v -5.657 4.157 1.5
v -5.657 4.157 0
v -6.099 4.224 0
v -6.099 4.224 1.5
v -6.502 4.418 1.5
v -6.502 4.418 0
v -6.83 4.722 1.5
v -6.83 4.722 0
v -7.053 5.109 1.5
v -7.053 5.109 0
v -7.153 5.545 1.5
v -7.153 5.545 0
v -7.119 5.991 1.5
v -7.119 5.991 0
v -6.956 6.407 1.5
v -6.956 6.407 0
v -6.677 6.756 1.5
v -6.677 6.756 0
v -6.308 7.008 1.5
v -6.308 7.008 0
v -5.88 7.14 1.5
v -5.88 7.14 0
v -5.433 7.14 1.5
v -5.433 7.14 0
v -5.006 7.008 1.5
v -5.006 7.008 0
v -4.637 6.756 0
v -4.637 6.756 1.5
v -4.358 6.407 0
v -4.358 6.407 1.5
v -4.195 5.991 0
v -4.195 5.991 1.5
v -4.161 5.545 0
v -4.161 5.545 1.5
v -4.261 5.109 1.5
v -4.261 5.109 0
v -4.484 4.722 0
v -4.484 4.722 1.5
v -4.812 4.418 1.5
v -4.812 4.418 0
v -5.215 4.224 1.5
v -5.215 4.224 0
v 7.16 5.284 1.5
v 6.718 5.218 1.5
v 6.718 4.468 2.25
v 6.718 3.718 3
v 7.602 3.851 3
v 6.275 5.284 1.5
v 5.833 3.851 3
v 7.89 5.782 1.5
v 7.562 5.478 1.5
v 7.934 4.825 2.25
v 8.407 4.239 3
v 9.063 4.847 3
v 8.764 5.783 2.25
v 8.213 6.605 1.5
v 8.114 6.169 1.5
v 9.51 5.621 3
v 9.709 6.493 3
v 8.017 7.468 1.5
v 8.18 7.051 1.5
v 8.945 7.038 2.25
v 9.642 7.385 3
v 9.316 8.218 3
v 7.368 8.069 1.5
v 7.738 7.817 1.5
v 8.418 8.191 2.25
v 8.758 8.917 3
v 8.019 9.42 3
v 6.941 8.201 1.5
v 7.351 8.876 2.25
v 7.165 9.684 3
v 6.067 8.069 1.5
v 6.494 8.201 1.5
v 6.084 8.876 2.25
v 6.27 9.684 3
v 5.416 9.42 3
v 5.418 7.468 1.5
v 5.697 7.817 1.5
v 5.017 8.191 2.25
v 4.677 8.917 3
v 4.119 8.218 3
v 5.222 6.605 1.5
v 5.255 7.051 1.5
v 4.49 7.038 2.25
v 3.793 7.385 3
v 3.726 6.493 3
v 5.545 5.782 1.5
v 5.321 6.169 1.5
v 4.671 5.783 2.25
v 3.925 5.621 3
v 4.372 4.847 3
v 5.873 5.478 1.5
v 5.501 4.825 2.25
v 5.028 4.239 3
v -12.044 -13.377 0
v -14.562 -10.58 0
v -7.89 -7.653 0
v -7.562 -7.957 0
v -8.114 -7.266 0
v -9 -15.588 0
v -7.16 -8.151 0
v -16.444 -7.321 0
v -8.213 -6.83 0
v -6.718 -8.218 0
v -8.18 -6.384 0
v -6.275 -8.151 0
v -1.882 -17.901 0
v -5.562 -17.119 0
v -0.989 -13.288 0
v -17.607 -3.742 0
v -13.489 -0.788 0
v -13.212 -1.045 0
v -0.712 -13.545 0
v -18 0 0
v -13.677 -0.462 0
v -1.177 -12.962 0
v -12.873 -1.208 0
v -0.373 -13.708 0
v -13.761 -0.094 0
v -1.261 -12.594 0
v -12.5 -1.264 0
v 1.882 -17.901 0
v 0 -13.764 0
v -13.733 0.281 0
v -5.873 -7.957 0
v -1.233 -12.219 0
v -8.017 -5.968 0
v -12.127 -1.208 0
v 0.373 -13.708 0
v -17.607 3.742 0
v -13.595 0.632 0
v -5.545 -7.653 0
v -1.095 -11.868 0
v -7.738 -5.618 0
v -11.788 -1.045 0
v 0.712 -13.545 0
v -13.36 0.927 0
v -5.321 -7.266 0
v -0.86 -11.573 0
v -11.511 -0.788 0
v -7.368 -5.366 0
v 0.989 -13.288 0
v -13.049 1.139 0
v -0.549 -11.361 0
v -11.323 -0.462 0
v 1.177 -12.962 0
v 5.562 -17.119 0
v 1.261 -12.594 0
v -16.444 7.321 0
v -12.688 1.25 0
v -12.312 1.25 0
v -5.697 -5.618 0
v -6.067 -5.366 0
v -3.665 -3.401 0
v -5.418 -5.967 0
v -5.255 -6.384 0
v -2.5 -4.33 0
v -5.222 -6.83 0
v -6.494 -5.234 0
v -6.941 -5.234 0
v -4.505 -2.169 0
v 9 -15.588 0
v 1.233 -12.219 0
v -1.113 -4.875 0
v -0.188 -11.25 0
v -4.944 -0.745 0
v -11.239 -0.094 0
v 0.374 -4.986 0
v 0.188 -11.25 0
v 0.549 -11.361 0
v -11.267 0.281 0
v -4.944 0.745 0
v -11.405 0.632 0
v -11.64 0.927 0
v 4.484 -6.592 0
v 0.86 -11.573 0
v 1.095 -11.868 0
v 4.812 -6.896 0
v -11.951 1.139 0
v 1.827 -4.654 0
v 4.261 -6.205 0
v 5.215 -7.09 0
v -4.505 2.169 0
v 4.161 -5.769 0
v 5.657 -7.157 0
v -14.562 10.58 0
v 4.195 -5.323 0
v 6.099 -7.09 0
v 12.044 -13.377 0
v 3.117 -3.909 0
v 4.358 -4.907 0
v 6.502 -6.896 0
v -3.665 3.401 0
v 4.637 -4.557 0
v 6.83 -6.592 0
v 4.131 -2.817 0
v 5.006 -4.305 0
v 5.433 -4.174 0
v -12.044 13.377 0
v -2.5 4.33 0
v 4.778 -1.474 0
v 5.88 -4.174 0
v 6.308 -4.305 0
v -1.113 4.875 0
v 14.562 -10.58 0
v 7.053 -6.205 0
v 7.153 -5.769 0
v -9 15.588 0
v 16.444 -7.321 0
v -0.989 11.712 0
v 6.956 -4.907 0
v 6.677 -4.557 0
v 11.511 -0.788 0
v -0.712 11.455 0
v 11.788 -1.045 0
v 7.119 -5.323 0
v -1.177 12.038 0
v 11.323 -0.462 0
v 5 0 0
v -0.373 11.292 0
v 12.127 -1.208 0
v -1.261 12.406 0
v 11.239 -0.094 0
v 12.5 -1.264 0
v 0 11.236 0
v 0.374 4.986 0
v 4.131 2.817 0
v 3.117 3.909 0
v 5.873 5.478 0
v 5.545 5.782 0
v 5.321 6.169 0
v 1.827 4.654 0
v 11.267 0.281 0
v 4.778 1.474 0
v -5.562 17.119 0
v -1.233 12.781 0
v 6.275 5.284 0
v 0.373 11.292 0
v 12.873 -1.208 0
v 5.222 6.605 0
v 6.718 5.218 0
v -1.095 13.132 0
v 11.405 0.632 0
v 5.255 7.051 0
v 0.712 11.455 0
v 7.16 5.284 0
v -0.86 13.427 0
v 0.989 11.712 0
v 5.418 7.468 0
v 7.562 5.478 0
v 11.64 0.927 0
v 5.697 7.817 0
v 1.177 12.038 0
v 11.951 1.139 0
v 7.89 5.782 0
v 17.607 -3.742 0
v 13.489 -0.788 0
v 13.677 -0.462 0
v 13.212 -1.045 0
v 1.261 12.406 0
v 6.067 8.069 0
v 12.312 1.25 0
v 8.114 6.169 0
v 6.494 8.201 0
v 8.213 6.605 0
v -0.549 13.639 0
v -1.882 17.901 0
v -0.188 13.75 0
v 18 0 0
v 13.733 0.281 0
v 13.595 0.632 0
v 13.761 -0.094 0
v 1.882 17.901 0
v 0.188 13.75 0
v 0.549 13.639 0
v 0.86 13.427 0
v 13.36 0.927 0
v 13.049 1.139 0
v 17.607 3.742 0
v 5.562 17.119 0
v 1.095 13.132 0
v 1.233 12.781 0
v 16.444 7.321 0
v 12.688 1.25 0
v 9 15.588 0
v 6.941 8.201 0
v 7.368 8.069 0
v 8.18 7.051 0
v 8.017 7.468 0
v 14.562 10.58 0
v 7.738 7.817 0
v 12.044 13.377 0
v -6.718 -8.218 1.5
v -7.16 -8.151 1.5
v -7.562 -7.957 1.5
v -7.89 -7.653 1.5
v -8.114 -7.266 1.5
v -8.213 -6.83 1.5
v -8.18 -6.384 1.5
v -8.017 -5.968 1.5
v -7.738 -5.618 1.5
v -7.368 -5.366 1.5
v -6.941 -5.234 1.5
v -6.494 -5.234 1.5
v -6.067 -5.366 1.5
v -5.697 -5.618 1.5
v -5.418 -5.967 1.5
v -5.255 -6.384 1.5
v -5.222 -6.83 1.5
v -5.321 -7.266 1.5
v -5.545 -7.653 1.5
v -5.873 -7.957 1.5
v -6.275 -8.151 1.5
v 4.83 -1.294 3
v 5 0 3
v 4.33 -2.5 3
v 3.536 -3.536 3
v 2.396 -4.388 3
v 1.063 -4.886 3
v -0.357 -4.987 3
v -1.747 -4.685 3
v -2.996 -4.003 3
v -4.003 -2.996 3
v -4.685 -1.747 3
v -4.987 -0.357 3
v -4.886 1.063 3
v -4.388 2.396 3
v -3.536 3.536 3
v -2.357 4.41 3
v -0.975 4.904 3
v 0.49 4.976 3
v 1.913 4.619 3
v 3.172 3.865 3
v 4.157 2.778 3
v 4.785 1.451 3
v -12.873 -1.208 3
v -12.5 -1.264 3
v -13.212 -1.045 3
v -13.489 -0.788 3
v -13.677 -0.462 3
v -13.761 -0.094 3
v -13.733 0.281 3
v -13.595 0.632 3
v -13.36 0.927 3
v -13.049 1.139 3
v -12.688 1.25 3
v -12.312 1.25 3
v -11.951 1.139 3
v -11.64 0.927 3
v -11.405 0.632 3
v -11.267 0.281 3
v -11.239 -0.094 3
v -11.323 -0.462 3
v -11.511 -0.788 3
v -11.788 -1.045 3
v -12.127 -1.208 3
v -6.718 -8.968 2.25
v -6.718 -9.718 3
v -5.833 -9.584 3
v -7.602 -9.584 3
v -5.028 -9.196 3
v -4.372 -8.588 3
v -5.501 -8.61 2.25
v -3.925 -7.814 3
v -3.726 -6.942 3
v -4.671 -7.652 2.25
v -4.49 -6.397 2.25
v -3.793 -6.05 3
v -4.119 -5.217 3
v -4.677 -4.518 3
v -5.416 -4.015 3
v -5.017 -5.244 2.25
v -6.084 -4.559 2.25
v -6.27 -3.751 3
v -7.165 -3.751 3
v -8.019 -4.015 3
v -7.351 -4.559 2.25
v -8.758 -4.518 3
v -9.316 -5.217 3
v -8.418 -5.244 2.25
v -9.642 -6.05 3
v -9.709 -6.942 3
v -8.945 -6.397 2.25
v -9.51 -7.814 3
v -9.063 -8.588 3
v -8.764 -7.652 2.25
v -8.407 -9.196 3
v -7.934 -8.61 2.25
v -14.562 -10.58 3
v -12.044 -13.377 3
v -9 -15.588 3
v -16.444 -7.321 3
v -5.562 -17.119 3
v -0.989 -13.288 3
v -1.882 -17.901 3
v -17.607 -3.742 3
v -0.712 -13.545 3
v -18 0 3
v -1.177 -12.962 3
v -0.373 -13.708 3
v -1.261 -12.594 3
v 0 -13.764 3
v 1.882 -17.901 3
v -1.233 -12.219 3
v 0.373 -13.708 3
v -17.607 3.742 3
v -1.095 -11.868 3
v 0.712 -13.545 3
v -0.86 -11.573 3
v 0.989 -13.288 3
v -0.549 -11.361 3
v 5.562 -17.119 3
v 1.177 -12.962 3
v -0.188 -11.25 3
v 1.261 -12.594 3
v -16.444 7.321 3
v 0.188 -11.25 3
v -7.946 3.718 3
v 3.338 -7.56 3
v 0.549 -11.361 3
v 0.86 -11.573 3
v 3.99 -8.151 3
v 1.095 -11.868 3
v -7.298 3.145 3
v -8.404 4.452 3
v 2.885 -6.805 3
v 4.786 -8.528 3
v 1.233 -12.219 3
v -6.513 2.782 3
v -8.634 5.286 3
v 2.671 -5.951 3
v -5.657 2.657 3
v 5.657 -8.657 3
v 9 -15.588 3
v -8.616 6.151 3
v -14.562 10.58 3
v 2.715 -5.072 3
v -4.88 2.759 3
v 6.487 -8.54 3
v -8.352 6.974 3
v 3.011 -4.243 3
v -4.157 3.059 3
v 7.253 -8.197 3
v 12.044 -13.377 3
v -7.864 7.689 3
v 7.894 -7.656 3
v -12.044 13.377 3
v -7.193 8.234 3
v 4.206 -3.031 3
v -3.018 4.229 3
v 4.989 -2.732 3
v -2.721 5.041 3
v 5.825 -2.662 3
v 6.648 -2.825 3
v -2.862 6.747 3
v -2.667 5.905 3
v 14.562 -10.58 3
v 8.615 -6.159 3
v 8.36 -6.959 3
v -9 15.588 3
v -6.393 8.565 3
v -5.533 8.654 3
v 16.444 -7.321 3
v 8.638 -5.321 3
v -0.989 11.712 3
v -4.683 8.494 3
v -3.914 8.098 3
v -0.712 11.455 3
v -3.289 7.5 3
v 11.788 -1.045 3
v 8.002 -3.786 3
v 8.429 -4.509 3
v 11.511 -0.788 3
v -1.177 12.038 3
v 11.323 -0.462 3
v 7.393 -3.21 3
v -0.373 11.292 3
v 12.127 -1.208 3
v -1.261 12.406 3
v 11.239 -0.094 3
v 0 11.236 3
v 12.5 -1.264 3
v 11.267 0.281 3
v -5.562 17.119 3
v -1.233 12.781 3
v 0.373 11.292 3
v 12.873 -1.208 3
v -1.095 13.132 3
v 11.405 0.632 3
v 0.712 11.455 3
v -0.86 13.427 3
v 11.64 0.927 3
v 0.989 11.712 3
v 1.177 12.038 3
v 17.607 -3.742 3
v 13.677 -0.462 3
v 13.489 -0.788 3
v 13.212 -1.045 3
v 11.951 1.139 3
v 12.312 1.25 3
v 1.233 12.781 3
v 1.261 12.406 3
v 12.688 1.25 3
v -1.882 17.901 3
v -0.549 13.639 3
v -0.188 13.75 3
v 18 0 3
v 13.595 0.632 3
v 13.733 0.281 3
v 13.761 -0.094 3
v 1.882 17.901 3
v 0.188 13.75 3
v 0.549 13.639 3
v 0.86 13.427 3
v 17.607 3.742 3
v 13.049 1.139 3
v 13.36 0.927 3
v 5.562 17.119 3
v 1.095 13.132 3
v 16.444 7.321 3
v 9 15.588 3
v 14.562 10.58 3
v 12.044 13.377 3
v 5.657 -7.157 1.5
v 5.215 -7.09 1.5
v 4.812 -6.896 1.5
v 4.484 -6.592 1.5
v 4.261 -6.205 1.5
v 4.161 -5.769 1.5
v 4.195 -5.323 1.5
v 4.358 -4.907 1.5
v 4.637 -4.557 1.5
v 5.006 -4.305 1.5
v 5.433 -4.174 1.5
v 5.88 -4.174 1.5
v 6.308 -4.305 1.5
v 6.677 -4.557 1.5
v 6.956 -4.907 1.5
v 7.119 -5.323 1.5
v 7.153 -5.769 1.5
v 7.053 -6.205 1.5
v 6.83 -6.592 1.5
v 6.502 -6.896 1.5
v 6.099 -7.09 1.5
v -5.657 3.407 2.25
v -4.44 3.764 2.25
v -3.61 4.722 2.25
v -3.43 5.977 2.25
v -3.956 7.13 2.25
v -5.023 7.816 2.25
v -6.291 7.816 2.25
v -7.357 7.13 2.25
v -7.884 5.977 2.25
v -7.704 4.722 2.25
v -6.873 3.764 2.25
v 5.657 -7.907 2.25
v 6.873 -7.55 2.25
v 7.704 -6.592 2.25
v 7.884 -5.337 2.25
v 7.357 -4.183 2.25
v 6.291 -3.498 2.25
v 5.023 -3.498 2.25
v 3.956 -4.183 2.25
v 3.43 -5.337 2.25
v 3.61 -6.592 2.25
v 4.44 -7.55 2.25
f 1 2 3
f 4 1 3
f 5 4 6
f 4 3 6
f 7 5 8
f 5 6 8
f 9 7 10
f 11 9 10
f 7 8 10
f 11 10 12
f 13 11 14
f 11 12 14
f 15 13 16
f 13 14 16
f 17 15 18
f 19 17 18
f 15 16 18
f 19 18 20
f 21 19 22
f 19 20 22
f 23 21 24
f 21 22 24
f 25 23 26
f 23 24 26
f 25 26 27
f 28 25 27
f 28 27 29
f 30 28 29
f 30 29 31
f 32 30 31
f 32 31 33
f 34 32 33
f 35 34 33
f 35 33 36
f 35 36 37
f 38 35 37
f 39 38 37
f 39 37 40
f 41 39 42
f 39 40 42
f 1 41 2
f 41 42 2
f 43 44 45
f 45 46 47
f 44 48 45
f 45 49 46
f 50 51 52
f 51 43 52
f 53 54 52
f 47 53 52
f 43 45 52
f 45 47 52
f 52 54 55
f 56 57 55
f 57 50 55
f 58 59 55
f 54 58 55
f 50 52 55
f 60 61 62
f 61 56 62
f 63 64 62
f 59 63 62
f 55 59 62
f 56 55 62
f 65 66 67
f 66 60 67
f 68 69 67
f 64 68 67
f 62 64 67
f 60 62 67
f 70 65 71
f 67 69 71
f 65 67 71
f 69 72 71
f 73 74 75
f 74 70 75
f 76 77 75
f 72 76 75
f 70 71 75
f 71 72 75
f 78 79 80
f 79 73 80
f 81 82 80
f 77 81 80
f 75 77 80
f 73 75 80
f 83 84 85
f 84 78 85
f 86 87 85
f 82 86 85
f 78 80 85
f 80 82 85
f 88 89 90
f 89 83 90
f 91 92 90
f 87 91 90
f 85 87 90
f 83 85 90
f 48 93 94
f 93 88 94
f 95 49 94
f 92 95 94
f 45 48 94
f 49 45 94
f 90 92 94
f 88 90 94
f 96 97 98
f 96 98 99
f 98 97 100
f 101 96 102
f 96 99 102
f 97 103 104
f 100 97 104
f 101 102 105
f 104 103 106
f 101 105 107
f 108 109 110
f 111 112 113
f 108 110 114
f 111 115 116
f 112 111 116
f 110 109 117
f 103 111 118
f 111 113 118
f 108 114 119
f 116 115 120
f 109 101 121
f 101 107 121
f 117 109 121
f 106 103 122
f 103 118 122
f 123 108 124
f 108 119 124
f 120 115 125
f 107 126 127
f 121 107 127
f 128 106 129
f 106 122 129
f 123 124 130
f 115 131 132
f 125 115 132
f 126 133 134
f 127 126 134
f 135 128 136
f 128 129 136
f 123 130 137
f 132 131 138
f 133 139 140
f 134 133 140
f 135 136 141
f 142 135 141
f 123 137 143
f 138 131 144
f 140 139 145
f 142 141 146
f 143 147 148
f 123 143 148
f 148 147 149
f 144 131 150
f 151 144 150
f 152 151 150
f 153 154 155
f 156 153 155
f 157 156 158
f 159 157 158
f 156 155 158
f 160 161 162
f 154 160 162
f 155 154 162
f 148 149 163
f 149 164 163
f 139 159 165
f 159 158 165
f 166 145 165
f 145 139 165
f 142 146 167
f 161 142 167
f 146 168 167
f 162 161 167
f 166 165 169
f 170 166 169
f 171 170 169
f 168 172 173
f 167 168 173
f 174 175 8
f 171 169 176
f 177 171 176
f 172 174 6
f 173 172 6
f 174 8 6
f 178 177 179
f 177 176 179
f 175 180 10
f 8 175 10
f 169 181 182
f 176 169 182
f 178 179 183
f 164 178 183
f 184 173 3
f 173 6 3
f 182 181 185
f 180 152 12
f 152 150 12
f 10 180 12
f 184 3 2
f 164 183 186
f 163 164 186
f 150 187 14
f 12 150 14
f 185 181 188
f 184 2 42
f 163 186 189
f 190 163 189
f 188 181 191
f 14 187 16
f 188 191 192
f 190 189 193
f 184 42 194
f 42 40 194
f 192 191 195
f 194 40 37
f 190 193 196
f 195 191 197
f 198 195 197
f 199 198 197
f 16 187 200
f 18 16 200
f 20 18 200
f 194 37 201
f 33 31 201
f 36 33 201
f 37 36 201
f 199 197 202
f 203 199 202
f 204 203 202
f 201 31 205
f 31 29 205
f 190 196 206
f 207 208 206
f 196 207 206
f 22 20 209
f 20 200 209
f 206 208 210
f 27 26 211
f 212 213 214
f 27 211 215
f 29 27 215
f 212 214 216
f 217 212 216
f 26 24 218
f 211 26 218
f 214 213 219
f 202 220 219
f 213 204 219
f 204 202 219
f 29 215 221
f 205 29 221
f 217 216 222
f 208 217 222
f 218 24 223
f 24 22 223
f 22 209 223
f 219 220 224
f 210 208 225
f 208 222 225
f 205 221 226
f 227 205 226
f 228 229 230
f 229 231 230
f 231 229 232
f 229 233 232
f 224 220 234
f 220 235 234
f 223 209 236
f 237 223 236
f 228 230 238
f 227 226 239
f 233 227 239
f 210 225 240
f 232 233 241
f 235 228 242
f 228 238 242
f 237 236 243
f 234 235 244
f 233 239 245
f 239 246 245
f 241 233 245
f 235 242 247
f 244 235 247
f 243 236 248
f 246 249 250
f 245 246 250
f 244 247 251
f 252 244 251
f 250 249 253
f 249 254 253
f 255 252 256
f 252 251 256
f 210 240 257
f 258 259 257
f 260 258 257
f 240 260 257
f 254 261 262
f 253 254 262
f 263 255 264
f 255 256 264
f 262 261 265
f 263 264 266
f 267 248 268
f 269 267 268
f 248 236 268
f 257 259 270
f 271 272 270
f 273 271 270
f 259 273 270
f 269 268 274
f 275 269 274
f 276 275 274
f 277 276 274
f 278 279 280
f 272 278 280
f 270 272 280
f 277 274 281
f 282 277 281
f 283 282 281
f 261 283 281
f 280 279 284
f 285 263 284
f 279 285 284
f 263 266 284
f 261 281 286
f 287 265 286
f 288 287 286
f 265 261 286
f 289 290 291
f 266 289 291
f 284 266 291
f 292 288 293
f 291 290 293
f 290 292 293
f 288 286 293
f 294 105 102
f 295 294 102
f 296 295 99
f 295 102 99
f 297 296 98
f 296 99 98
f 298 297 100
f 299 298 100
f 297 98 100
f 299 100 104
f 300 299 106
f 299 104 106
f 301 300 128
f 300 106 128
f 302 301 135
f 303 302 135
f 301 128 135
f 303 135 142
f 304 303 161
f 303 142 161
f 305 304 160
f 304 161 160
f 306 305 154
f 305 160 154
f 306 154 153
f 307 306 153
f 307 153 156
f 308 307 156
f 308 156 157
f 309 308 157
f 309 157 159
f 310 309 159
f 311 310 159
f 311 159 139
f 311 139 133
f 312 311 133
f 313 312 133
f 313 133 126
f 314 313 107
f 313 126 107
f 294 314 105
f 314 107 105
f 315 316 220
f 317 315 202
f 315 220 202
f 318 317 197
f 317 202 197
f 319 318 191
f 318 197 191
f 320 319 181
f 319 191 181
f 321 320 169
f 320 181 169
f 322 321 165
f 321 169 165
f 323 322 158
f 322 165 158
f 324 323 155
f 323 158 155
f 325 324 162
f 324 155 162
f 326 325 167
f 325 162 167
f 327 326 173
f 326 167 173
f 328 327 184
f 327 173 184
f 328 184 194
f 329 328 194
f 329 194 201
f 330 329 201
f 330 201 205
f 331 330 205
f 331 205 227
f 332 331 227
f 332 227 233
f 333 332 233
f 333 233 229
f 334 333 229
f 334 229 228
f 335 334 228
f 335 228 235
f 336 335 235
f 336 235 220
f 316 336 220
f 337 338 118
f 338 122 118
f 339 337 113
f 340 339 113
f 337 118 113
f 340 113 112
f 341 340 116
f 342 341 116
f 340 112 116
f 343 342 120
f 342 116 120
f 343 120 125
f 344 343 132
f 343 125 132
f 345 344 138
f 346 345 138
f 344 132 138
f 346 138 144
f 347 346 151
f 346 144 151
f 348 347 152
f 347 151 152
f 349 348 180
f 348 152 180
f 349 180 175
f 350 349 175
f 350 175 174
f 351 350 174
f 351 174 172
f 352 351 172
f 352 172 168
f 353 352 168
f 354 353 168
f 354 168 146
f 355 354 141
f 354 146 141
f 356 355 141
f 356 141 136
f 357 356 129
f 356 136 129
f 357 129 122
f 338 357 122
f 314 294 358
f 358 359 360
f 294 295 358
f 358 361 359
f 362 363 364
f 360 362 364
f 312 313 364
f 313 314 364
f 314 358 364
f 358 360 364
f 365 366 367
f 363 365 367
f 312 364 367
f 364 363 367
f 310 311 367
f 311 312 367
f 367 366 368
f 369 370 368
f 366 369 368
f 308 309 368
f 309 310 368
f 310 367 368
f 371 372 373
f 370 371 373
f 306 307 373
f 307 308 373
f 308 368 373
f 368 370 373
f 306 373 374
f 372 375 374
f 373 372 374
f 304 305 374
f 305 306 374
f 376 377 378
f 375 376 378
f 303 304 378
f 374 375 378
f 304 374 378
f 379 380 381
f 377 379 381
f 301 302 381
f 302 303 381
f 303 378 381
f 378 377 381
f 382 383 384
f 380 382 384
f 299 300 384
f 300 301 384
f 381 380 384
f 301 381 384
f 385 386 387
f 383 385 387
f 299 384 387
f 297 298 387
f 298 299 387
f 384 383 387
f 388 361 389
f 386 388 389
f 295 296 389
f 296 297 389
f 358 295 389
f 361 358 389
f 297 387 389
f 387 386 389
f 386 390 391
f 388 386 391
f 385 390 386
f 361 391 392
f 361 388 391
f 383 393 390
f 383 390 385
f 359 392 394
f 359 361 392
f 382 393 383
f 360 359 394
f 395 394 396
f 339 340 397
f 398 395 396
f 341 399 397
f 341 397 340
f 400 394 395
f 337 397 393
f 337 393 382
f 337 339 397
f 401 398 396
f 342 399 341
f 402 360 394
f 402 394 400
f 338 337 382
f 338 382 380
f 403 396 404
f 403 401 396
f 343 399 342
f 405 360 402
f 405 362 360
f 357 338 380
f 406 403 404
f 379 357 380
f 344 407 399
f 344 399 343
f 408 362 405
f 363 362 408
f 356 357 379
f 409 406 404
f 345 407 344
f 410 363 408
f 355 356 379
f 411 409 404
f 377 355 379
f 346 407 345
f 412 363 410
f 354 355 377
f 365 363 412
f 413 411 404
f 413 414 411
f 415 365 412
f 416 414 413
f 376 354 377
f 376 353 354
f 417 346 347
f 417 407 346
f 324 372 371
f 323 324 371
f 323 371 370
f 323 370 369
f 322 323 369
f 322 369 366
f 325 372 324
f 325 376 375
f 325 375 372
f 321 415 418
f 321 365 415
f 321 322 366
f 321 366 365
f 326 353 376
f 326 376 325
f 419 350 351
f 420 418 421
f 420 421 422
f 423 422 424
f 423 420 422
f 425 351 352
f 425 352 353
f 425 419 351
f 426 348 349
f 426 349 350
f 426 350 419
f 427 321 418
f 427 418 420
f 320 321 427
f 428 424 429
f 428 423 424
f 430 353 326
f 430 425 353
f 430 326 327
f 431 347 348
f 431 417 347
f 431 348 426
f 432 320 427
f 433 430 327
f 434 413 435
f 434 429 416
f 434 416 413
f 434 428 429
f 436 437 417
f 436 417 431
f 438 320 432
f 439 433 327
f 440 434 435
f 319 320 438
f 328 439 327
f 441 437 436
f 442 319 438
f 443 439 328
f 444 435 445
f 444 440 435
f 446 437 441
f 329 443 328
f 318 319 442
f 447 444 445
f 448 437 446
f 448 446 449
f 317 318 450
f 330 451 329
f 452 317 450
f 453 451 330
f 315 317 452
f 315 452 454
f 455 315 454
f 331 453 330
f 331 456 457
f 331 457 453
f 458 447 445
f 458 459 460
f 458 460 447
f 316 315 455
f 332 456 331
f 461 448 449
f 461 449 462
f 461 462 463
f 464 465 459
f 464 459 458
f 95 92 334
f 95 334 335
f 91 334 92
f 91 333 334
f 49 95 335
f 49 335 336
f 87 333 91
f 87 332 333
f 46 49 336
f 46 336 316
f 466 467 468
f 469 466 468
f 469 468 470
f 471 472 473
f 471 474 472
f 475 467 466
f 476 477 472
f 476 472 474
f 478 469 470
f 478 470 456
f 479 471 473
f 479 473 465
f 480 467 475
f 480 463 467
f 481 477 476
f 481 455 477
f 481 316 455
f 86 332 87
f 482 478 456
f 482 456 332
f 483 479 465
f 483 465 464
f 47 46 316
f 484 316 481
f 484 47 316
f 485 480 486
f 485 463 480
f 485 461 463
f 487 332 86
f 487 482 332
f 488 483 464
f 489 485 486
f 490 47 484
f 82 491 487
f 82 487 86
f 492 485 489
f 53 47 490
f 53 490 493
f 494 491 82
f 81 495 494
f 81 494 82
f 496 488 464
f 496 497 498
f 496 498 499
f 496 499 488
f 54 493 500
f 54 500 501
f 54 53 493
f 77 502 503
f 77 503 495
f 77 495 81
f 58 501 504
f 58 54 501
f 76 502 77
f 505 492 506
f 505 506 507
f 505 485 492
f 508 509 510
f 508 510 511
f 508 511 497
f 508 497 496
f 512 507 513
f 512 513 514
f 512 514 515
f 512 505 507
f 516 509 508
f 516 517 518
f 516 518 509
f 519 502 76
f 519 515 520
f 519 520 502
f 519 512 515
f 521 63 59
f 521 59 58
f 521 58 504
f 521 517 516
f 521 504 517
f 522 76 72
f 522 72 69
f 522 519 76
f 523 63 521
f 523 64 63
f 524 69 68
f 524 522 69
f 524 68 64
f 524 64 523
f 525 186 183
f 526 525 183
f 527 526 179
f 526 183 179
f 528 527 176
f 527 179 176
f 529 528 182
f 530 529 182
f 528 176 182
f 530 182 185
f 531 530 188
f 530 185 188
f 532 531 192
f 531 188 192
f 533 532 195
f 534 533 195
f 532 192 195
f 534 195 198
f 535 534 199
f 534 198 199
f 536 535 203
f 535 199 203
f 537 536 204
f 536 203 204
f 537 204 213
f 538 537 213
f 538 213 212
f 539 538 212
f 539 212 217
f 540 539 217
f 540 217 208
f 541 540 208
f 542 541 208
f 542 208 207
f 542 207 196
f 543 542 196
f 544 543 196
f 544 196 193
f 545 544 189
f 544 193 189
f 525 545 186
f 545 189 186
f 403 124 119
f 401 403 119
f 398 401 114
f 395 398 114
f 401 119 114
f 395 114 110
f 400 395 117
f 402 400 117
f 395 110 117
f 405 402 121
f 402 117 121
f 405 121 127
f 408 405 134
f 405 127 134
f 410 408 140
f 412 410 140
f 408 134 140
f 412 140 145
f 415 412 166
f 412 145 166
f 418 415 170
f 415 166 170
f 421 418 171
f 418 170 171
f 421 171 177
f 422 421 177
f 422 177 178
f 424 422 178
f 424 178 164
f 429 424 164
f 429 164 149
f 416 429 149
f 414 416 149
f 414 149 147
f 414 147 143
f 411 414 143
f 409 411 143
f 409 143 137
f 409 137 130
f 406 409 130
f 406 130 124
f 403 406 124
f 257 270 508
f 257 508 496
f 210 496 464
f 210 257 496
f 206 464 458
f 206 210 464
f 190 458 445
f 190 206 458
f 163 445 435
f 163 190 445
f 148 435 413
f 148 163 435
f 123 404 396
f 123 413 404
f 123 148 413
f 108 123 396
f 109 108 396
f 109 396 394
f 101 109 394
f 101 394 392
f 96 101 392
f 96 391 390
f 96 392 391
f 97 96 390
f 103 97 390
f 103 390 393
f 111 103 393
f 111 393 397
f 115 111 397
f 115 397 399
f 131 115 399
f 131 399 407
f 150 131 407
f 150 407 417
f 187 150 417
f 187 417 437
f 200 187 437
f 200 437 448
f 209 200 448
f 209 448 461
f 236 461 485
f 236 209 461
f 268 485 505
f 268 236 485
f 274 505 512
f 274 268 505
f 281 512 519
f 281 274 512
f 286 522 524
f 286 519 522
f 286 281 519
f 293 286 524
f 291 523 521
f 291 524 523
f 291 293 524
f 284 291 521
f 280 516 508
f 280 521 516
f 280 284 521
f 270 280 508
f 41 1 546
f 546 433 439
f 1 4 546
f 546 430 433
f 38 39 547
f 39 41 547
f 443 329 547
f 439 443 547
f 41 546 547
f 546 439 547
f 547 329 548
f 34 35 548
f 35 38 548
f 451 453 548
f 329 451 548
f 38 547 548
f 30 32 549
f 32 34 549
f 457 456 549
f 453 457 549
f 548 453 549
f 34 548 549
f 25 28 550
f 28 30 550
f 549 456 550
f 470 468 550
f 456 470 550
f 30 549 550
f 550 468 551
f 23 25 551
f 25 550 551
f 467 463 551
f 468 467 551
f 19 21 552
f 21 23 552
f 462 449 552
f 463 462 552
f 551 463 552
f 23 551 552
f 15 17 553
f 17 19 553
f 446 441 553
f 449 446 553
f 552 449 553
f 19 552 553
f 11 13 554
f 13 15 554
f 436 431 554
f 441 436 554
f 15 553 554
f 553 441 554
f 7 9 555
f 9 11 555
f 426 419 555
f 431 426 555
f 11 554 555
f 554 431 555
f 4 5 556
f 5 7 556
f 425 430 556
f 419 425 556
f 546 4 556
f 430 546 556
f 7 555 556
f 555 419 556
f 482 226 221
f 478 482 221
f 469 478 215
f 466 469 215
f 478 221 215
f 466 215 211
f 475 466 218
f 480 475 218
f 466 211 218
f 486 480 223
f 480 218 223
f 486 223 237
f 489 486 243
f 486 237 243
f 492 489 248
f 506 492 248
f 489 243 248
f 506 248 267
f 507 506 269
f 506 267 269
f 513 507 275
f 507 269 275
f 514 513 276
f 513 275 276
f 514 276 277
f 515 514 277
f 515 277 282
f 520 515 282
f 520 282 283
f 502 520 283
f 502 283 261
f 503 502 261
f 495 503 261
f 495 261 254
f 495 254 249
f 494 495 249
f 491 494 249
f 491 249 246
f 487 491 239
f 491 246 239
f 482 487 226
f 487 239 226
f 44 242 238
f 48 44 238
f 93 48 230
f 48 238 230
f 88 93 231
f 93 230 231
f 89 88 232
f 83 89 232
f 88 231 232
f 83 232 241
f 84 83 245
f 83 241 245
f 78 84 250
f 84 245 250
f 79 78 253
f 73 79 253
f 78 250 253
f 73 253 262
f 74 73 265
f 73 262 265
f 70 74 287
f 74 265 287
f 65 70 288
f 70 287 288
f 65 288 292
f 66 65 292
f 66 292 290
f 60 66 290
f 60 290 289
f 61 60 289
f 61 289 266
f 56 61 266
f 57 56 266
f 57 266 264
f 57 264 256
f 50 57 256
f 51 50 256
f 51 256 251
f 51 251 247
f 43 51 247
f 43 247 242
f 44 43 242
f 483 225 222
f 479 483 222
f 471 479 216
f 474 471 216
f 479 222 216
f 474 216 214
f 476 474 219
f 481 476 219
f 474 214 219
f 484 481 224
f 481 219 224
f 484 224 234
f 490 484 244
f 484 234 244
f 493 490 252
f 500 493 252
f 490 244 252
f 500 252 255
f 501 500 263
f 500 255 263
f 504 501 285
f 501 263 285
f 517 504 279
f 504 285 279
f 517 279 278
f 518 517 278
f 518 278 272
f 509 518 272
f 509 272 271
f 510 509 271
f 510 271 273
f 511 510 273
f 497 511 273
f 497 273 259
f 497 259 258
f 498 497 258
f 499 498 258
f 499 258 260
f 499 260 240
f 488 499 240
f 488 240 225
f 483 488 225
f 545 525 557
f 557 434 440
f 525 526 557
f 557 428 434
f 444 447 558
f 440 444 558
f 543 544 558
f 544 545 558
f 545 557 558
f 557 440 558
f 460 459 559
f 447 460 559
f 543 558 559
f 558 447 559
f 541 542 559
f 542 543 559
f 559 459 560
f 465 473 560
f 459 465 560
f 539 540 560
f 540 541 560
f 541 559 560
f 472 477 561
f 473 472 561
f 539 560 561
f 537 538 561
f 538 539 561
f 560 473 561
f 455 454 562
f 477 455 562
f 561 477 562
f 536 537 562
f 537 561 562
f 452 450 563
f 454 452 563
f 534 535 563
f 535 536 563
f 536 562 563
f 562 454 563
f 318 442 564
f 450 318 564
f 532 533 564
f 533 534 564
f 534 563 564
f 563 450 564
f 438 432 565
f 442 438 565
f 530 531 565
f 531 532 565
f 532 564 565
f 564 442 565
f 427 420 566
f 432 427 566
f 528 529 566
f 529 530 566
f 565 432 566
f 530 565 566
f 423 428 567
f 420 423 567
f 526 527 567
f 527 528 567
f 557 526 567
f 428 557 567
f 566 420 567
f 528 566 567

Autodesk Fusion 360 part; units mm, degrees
sketch "草图1" plane through (0, 0, 0) normal (0, 0, 1) x (1, 0, 0)
  line L0 (0, 0) -> (51.8, 0) construction
  line L1 (0, 0) -> (0, 48.8683) construction
  circle A0 centre (0, 0) radius 18
  circle A1 centre (0, 0) radius 5
  line L2 (0, 0) -> (20.6611, 20.6611) construction
  line L3 (0, 0) -> (29.2192, 0) construction
  line L4 (0, 0) -> (15.4724, -15.4724) construction
  line L5 (0, 0) -> (21.8812, 0) construction
  point P0 (6.7175, 6.7175)
  point P1 (5.6569, -5.6569)
  point P2 (-6.7175, -6.7175)
  point P3 (-5.6569, 5.6569)
  point P4 (12.5, 0)
  point P5 (-12.5, 0)
  point P6 (0, -12.5)
  point P7 (0, 12.5)
  dimension "d1" = 36
  dimension "d2" = 10
  dimension "d3" = 45
  dimension "d4" = 45
  dimension "d5" = 9.5
  dimension "d6" = 8
  dimension "d7" = 12.5
extrude "拉伸1" add sketch "草图1" along normal blind 3
sketch "草图3" plane through (0, 0, 3) normal (0, 0, 1) x (-1, 0, 0)
  circle A0 centre (0, 0) radius 5
  circle A1 centre (0, 0) radius 18
  line L0 (0, 0) -> (-31, 0) construction
  line L1 (0, 0) -> (17.0073, -17.0073) construction
  line L2 (0, 0) -> (27.2176, 0) construction
  line L3 (0, 0) -> (-13.435, -13.435) construction
  point P0 (-6.7175, -6.7175)
  point P1 (5.6569, -5.6569)
  point P2 (6.7175, 6.7175)
  point P3 (-5.6569, 5.6569)
  dimension "d10" = 45
  dimension "d11" = 45
  dimension "d12" = 9.5
  dimension "d13" = 8
hole "孔1" at (6.7175, 6.7175, 3) at (-5.6569, 5.6569, 3) at (-6.7175, -6.7175, 3) at (5.6569, -5.6569, 3) direction (0, 0, -1) diameter 3 depth 5 tip angle 118 countersink diameter 6 countersink angle 90
sketch "草图4" plane through (0, 0, 3) normal (0, 0, 1) x (-1, 0, 0)
  circle A0 centre (0, 0) radius 18
  arc A1 (3.5355, -3.5355) -> (-3.5355, 3.5355) centre (0, 0) ccw
  circle A2 centre (5.6569, -5.6569) radius 3
  arc A3 (-3.5355, 3.5355) -> (3.5355, -3.5355) centre (0, 0) ccw
  circle A4 centre (-5.6569, 5.6569) radius 3
  circle A5 centre (-6.7175, -6.7175) radius 3
  circle A6 centre (6.7175, 6.7175) radius 3
  line L0 (0, 0) -> (-28, 0) construction
  line L1 (0, 0) -> (0, -25) construction
  line L2 (0, 0) -> (-17, -17) construction
  point P0 (0, -12.5)
  point P1 (0, 12.5)
  point P2 (-12.5, 0)
  point P3 (12.5, 0)
  dimension "d19" = 12.5
  dimension "d20" = 45
hole "孔2" at (0, 12.5, 3) at (-12.5, 0, 3) at (0, -12.5, 3) at (12.5, 0, 3) direction (0, 0, -1) diameter 2.529 depth 5 tip angle 118
sketch "草图5" plane through (0, 0, 0) normal (0, 0, -1) x (1, 0, 0)
  circle A0 centre (0, 12.5) radius 1.2645
  circle A1 centre (0, -12.5) radius 1.2645
  circle A2 centre (-12.5, 0) radius 1.2645
  circle A3 centre (12.5, 0) radius 1.2645
  circle A4 centre (-6.7175, 6.7175) radius 1.5
  circle A5 centre (6.7175, -6.7175) radius 1.5
  circle A6 centre (-5.6569, -5.6569) radius 1.5
  circle A7 centre (5.6569, 5.6569) radius 1.5
  circle A8 centre (0, 0) radius 5
  circle A9 centre (0, 0) radius 18
equation "d7 = ( 25 / 2 ) * 1 mm"
equation "d19 = ( 25 / 2 ) * 1 mm"
